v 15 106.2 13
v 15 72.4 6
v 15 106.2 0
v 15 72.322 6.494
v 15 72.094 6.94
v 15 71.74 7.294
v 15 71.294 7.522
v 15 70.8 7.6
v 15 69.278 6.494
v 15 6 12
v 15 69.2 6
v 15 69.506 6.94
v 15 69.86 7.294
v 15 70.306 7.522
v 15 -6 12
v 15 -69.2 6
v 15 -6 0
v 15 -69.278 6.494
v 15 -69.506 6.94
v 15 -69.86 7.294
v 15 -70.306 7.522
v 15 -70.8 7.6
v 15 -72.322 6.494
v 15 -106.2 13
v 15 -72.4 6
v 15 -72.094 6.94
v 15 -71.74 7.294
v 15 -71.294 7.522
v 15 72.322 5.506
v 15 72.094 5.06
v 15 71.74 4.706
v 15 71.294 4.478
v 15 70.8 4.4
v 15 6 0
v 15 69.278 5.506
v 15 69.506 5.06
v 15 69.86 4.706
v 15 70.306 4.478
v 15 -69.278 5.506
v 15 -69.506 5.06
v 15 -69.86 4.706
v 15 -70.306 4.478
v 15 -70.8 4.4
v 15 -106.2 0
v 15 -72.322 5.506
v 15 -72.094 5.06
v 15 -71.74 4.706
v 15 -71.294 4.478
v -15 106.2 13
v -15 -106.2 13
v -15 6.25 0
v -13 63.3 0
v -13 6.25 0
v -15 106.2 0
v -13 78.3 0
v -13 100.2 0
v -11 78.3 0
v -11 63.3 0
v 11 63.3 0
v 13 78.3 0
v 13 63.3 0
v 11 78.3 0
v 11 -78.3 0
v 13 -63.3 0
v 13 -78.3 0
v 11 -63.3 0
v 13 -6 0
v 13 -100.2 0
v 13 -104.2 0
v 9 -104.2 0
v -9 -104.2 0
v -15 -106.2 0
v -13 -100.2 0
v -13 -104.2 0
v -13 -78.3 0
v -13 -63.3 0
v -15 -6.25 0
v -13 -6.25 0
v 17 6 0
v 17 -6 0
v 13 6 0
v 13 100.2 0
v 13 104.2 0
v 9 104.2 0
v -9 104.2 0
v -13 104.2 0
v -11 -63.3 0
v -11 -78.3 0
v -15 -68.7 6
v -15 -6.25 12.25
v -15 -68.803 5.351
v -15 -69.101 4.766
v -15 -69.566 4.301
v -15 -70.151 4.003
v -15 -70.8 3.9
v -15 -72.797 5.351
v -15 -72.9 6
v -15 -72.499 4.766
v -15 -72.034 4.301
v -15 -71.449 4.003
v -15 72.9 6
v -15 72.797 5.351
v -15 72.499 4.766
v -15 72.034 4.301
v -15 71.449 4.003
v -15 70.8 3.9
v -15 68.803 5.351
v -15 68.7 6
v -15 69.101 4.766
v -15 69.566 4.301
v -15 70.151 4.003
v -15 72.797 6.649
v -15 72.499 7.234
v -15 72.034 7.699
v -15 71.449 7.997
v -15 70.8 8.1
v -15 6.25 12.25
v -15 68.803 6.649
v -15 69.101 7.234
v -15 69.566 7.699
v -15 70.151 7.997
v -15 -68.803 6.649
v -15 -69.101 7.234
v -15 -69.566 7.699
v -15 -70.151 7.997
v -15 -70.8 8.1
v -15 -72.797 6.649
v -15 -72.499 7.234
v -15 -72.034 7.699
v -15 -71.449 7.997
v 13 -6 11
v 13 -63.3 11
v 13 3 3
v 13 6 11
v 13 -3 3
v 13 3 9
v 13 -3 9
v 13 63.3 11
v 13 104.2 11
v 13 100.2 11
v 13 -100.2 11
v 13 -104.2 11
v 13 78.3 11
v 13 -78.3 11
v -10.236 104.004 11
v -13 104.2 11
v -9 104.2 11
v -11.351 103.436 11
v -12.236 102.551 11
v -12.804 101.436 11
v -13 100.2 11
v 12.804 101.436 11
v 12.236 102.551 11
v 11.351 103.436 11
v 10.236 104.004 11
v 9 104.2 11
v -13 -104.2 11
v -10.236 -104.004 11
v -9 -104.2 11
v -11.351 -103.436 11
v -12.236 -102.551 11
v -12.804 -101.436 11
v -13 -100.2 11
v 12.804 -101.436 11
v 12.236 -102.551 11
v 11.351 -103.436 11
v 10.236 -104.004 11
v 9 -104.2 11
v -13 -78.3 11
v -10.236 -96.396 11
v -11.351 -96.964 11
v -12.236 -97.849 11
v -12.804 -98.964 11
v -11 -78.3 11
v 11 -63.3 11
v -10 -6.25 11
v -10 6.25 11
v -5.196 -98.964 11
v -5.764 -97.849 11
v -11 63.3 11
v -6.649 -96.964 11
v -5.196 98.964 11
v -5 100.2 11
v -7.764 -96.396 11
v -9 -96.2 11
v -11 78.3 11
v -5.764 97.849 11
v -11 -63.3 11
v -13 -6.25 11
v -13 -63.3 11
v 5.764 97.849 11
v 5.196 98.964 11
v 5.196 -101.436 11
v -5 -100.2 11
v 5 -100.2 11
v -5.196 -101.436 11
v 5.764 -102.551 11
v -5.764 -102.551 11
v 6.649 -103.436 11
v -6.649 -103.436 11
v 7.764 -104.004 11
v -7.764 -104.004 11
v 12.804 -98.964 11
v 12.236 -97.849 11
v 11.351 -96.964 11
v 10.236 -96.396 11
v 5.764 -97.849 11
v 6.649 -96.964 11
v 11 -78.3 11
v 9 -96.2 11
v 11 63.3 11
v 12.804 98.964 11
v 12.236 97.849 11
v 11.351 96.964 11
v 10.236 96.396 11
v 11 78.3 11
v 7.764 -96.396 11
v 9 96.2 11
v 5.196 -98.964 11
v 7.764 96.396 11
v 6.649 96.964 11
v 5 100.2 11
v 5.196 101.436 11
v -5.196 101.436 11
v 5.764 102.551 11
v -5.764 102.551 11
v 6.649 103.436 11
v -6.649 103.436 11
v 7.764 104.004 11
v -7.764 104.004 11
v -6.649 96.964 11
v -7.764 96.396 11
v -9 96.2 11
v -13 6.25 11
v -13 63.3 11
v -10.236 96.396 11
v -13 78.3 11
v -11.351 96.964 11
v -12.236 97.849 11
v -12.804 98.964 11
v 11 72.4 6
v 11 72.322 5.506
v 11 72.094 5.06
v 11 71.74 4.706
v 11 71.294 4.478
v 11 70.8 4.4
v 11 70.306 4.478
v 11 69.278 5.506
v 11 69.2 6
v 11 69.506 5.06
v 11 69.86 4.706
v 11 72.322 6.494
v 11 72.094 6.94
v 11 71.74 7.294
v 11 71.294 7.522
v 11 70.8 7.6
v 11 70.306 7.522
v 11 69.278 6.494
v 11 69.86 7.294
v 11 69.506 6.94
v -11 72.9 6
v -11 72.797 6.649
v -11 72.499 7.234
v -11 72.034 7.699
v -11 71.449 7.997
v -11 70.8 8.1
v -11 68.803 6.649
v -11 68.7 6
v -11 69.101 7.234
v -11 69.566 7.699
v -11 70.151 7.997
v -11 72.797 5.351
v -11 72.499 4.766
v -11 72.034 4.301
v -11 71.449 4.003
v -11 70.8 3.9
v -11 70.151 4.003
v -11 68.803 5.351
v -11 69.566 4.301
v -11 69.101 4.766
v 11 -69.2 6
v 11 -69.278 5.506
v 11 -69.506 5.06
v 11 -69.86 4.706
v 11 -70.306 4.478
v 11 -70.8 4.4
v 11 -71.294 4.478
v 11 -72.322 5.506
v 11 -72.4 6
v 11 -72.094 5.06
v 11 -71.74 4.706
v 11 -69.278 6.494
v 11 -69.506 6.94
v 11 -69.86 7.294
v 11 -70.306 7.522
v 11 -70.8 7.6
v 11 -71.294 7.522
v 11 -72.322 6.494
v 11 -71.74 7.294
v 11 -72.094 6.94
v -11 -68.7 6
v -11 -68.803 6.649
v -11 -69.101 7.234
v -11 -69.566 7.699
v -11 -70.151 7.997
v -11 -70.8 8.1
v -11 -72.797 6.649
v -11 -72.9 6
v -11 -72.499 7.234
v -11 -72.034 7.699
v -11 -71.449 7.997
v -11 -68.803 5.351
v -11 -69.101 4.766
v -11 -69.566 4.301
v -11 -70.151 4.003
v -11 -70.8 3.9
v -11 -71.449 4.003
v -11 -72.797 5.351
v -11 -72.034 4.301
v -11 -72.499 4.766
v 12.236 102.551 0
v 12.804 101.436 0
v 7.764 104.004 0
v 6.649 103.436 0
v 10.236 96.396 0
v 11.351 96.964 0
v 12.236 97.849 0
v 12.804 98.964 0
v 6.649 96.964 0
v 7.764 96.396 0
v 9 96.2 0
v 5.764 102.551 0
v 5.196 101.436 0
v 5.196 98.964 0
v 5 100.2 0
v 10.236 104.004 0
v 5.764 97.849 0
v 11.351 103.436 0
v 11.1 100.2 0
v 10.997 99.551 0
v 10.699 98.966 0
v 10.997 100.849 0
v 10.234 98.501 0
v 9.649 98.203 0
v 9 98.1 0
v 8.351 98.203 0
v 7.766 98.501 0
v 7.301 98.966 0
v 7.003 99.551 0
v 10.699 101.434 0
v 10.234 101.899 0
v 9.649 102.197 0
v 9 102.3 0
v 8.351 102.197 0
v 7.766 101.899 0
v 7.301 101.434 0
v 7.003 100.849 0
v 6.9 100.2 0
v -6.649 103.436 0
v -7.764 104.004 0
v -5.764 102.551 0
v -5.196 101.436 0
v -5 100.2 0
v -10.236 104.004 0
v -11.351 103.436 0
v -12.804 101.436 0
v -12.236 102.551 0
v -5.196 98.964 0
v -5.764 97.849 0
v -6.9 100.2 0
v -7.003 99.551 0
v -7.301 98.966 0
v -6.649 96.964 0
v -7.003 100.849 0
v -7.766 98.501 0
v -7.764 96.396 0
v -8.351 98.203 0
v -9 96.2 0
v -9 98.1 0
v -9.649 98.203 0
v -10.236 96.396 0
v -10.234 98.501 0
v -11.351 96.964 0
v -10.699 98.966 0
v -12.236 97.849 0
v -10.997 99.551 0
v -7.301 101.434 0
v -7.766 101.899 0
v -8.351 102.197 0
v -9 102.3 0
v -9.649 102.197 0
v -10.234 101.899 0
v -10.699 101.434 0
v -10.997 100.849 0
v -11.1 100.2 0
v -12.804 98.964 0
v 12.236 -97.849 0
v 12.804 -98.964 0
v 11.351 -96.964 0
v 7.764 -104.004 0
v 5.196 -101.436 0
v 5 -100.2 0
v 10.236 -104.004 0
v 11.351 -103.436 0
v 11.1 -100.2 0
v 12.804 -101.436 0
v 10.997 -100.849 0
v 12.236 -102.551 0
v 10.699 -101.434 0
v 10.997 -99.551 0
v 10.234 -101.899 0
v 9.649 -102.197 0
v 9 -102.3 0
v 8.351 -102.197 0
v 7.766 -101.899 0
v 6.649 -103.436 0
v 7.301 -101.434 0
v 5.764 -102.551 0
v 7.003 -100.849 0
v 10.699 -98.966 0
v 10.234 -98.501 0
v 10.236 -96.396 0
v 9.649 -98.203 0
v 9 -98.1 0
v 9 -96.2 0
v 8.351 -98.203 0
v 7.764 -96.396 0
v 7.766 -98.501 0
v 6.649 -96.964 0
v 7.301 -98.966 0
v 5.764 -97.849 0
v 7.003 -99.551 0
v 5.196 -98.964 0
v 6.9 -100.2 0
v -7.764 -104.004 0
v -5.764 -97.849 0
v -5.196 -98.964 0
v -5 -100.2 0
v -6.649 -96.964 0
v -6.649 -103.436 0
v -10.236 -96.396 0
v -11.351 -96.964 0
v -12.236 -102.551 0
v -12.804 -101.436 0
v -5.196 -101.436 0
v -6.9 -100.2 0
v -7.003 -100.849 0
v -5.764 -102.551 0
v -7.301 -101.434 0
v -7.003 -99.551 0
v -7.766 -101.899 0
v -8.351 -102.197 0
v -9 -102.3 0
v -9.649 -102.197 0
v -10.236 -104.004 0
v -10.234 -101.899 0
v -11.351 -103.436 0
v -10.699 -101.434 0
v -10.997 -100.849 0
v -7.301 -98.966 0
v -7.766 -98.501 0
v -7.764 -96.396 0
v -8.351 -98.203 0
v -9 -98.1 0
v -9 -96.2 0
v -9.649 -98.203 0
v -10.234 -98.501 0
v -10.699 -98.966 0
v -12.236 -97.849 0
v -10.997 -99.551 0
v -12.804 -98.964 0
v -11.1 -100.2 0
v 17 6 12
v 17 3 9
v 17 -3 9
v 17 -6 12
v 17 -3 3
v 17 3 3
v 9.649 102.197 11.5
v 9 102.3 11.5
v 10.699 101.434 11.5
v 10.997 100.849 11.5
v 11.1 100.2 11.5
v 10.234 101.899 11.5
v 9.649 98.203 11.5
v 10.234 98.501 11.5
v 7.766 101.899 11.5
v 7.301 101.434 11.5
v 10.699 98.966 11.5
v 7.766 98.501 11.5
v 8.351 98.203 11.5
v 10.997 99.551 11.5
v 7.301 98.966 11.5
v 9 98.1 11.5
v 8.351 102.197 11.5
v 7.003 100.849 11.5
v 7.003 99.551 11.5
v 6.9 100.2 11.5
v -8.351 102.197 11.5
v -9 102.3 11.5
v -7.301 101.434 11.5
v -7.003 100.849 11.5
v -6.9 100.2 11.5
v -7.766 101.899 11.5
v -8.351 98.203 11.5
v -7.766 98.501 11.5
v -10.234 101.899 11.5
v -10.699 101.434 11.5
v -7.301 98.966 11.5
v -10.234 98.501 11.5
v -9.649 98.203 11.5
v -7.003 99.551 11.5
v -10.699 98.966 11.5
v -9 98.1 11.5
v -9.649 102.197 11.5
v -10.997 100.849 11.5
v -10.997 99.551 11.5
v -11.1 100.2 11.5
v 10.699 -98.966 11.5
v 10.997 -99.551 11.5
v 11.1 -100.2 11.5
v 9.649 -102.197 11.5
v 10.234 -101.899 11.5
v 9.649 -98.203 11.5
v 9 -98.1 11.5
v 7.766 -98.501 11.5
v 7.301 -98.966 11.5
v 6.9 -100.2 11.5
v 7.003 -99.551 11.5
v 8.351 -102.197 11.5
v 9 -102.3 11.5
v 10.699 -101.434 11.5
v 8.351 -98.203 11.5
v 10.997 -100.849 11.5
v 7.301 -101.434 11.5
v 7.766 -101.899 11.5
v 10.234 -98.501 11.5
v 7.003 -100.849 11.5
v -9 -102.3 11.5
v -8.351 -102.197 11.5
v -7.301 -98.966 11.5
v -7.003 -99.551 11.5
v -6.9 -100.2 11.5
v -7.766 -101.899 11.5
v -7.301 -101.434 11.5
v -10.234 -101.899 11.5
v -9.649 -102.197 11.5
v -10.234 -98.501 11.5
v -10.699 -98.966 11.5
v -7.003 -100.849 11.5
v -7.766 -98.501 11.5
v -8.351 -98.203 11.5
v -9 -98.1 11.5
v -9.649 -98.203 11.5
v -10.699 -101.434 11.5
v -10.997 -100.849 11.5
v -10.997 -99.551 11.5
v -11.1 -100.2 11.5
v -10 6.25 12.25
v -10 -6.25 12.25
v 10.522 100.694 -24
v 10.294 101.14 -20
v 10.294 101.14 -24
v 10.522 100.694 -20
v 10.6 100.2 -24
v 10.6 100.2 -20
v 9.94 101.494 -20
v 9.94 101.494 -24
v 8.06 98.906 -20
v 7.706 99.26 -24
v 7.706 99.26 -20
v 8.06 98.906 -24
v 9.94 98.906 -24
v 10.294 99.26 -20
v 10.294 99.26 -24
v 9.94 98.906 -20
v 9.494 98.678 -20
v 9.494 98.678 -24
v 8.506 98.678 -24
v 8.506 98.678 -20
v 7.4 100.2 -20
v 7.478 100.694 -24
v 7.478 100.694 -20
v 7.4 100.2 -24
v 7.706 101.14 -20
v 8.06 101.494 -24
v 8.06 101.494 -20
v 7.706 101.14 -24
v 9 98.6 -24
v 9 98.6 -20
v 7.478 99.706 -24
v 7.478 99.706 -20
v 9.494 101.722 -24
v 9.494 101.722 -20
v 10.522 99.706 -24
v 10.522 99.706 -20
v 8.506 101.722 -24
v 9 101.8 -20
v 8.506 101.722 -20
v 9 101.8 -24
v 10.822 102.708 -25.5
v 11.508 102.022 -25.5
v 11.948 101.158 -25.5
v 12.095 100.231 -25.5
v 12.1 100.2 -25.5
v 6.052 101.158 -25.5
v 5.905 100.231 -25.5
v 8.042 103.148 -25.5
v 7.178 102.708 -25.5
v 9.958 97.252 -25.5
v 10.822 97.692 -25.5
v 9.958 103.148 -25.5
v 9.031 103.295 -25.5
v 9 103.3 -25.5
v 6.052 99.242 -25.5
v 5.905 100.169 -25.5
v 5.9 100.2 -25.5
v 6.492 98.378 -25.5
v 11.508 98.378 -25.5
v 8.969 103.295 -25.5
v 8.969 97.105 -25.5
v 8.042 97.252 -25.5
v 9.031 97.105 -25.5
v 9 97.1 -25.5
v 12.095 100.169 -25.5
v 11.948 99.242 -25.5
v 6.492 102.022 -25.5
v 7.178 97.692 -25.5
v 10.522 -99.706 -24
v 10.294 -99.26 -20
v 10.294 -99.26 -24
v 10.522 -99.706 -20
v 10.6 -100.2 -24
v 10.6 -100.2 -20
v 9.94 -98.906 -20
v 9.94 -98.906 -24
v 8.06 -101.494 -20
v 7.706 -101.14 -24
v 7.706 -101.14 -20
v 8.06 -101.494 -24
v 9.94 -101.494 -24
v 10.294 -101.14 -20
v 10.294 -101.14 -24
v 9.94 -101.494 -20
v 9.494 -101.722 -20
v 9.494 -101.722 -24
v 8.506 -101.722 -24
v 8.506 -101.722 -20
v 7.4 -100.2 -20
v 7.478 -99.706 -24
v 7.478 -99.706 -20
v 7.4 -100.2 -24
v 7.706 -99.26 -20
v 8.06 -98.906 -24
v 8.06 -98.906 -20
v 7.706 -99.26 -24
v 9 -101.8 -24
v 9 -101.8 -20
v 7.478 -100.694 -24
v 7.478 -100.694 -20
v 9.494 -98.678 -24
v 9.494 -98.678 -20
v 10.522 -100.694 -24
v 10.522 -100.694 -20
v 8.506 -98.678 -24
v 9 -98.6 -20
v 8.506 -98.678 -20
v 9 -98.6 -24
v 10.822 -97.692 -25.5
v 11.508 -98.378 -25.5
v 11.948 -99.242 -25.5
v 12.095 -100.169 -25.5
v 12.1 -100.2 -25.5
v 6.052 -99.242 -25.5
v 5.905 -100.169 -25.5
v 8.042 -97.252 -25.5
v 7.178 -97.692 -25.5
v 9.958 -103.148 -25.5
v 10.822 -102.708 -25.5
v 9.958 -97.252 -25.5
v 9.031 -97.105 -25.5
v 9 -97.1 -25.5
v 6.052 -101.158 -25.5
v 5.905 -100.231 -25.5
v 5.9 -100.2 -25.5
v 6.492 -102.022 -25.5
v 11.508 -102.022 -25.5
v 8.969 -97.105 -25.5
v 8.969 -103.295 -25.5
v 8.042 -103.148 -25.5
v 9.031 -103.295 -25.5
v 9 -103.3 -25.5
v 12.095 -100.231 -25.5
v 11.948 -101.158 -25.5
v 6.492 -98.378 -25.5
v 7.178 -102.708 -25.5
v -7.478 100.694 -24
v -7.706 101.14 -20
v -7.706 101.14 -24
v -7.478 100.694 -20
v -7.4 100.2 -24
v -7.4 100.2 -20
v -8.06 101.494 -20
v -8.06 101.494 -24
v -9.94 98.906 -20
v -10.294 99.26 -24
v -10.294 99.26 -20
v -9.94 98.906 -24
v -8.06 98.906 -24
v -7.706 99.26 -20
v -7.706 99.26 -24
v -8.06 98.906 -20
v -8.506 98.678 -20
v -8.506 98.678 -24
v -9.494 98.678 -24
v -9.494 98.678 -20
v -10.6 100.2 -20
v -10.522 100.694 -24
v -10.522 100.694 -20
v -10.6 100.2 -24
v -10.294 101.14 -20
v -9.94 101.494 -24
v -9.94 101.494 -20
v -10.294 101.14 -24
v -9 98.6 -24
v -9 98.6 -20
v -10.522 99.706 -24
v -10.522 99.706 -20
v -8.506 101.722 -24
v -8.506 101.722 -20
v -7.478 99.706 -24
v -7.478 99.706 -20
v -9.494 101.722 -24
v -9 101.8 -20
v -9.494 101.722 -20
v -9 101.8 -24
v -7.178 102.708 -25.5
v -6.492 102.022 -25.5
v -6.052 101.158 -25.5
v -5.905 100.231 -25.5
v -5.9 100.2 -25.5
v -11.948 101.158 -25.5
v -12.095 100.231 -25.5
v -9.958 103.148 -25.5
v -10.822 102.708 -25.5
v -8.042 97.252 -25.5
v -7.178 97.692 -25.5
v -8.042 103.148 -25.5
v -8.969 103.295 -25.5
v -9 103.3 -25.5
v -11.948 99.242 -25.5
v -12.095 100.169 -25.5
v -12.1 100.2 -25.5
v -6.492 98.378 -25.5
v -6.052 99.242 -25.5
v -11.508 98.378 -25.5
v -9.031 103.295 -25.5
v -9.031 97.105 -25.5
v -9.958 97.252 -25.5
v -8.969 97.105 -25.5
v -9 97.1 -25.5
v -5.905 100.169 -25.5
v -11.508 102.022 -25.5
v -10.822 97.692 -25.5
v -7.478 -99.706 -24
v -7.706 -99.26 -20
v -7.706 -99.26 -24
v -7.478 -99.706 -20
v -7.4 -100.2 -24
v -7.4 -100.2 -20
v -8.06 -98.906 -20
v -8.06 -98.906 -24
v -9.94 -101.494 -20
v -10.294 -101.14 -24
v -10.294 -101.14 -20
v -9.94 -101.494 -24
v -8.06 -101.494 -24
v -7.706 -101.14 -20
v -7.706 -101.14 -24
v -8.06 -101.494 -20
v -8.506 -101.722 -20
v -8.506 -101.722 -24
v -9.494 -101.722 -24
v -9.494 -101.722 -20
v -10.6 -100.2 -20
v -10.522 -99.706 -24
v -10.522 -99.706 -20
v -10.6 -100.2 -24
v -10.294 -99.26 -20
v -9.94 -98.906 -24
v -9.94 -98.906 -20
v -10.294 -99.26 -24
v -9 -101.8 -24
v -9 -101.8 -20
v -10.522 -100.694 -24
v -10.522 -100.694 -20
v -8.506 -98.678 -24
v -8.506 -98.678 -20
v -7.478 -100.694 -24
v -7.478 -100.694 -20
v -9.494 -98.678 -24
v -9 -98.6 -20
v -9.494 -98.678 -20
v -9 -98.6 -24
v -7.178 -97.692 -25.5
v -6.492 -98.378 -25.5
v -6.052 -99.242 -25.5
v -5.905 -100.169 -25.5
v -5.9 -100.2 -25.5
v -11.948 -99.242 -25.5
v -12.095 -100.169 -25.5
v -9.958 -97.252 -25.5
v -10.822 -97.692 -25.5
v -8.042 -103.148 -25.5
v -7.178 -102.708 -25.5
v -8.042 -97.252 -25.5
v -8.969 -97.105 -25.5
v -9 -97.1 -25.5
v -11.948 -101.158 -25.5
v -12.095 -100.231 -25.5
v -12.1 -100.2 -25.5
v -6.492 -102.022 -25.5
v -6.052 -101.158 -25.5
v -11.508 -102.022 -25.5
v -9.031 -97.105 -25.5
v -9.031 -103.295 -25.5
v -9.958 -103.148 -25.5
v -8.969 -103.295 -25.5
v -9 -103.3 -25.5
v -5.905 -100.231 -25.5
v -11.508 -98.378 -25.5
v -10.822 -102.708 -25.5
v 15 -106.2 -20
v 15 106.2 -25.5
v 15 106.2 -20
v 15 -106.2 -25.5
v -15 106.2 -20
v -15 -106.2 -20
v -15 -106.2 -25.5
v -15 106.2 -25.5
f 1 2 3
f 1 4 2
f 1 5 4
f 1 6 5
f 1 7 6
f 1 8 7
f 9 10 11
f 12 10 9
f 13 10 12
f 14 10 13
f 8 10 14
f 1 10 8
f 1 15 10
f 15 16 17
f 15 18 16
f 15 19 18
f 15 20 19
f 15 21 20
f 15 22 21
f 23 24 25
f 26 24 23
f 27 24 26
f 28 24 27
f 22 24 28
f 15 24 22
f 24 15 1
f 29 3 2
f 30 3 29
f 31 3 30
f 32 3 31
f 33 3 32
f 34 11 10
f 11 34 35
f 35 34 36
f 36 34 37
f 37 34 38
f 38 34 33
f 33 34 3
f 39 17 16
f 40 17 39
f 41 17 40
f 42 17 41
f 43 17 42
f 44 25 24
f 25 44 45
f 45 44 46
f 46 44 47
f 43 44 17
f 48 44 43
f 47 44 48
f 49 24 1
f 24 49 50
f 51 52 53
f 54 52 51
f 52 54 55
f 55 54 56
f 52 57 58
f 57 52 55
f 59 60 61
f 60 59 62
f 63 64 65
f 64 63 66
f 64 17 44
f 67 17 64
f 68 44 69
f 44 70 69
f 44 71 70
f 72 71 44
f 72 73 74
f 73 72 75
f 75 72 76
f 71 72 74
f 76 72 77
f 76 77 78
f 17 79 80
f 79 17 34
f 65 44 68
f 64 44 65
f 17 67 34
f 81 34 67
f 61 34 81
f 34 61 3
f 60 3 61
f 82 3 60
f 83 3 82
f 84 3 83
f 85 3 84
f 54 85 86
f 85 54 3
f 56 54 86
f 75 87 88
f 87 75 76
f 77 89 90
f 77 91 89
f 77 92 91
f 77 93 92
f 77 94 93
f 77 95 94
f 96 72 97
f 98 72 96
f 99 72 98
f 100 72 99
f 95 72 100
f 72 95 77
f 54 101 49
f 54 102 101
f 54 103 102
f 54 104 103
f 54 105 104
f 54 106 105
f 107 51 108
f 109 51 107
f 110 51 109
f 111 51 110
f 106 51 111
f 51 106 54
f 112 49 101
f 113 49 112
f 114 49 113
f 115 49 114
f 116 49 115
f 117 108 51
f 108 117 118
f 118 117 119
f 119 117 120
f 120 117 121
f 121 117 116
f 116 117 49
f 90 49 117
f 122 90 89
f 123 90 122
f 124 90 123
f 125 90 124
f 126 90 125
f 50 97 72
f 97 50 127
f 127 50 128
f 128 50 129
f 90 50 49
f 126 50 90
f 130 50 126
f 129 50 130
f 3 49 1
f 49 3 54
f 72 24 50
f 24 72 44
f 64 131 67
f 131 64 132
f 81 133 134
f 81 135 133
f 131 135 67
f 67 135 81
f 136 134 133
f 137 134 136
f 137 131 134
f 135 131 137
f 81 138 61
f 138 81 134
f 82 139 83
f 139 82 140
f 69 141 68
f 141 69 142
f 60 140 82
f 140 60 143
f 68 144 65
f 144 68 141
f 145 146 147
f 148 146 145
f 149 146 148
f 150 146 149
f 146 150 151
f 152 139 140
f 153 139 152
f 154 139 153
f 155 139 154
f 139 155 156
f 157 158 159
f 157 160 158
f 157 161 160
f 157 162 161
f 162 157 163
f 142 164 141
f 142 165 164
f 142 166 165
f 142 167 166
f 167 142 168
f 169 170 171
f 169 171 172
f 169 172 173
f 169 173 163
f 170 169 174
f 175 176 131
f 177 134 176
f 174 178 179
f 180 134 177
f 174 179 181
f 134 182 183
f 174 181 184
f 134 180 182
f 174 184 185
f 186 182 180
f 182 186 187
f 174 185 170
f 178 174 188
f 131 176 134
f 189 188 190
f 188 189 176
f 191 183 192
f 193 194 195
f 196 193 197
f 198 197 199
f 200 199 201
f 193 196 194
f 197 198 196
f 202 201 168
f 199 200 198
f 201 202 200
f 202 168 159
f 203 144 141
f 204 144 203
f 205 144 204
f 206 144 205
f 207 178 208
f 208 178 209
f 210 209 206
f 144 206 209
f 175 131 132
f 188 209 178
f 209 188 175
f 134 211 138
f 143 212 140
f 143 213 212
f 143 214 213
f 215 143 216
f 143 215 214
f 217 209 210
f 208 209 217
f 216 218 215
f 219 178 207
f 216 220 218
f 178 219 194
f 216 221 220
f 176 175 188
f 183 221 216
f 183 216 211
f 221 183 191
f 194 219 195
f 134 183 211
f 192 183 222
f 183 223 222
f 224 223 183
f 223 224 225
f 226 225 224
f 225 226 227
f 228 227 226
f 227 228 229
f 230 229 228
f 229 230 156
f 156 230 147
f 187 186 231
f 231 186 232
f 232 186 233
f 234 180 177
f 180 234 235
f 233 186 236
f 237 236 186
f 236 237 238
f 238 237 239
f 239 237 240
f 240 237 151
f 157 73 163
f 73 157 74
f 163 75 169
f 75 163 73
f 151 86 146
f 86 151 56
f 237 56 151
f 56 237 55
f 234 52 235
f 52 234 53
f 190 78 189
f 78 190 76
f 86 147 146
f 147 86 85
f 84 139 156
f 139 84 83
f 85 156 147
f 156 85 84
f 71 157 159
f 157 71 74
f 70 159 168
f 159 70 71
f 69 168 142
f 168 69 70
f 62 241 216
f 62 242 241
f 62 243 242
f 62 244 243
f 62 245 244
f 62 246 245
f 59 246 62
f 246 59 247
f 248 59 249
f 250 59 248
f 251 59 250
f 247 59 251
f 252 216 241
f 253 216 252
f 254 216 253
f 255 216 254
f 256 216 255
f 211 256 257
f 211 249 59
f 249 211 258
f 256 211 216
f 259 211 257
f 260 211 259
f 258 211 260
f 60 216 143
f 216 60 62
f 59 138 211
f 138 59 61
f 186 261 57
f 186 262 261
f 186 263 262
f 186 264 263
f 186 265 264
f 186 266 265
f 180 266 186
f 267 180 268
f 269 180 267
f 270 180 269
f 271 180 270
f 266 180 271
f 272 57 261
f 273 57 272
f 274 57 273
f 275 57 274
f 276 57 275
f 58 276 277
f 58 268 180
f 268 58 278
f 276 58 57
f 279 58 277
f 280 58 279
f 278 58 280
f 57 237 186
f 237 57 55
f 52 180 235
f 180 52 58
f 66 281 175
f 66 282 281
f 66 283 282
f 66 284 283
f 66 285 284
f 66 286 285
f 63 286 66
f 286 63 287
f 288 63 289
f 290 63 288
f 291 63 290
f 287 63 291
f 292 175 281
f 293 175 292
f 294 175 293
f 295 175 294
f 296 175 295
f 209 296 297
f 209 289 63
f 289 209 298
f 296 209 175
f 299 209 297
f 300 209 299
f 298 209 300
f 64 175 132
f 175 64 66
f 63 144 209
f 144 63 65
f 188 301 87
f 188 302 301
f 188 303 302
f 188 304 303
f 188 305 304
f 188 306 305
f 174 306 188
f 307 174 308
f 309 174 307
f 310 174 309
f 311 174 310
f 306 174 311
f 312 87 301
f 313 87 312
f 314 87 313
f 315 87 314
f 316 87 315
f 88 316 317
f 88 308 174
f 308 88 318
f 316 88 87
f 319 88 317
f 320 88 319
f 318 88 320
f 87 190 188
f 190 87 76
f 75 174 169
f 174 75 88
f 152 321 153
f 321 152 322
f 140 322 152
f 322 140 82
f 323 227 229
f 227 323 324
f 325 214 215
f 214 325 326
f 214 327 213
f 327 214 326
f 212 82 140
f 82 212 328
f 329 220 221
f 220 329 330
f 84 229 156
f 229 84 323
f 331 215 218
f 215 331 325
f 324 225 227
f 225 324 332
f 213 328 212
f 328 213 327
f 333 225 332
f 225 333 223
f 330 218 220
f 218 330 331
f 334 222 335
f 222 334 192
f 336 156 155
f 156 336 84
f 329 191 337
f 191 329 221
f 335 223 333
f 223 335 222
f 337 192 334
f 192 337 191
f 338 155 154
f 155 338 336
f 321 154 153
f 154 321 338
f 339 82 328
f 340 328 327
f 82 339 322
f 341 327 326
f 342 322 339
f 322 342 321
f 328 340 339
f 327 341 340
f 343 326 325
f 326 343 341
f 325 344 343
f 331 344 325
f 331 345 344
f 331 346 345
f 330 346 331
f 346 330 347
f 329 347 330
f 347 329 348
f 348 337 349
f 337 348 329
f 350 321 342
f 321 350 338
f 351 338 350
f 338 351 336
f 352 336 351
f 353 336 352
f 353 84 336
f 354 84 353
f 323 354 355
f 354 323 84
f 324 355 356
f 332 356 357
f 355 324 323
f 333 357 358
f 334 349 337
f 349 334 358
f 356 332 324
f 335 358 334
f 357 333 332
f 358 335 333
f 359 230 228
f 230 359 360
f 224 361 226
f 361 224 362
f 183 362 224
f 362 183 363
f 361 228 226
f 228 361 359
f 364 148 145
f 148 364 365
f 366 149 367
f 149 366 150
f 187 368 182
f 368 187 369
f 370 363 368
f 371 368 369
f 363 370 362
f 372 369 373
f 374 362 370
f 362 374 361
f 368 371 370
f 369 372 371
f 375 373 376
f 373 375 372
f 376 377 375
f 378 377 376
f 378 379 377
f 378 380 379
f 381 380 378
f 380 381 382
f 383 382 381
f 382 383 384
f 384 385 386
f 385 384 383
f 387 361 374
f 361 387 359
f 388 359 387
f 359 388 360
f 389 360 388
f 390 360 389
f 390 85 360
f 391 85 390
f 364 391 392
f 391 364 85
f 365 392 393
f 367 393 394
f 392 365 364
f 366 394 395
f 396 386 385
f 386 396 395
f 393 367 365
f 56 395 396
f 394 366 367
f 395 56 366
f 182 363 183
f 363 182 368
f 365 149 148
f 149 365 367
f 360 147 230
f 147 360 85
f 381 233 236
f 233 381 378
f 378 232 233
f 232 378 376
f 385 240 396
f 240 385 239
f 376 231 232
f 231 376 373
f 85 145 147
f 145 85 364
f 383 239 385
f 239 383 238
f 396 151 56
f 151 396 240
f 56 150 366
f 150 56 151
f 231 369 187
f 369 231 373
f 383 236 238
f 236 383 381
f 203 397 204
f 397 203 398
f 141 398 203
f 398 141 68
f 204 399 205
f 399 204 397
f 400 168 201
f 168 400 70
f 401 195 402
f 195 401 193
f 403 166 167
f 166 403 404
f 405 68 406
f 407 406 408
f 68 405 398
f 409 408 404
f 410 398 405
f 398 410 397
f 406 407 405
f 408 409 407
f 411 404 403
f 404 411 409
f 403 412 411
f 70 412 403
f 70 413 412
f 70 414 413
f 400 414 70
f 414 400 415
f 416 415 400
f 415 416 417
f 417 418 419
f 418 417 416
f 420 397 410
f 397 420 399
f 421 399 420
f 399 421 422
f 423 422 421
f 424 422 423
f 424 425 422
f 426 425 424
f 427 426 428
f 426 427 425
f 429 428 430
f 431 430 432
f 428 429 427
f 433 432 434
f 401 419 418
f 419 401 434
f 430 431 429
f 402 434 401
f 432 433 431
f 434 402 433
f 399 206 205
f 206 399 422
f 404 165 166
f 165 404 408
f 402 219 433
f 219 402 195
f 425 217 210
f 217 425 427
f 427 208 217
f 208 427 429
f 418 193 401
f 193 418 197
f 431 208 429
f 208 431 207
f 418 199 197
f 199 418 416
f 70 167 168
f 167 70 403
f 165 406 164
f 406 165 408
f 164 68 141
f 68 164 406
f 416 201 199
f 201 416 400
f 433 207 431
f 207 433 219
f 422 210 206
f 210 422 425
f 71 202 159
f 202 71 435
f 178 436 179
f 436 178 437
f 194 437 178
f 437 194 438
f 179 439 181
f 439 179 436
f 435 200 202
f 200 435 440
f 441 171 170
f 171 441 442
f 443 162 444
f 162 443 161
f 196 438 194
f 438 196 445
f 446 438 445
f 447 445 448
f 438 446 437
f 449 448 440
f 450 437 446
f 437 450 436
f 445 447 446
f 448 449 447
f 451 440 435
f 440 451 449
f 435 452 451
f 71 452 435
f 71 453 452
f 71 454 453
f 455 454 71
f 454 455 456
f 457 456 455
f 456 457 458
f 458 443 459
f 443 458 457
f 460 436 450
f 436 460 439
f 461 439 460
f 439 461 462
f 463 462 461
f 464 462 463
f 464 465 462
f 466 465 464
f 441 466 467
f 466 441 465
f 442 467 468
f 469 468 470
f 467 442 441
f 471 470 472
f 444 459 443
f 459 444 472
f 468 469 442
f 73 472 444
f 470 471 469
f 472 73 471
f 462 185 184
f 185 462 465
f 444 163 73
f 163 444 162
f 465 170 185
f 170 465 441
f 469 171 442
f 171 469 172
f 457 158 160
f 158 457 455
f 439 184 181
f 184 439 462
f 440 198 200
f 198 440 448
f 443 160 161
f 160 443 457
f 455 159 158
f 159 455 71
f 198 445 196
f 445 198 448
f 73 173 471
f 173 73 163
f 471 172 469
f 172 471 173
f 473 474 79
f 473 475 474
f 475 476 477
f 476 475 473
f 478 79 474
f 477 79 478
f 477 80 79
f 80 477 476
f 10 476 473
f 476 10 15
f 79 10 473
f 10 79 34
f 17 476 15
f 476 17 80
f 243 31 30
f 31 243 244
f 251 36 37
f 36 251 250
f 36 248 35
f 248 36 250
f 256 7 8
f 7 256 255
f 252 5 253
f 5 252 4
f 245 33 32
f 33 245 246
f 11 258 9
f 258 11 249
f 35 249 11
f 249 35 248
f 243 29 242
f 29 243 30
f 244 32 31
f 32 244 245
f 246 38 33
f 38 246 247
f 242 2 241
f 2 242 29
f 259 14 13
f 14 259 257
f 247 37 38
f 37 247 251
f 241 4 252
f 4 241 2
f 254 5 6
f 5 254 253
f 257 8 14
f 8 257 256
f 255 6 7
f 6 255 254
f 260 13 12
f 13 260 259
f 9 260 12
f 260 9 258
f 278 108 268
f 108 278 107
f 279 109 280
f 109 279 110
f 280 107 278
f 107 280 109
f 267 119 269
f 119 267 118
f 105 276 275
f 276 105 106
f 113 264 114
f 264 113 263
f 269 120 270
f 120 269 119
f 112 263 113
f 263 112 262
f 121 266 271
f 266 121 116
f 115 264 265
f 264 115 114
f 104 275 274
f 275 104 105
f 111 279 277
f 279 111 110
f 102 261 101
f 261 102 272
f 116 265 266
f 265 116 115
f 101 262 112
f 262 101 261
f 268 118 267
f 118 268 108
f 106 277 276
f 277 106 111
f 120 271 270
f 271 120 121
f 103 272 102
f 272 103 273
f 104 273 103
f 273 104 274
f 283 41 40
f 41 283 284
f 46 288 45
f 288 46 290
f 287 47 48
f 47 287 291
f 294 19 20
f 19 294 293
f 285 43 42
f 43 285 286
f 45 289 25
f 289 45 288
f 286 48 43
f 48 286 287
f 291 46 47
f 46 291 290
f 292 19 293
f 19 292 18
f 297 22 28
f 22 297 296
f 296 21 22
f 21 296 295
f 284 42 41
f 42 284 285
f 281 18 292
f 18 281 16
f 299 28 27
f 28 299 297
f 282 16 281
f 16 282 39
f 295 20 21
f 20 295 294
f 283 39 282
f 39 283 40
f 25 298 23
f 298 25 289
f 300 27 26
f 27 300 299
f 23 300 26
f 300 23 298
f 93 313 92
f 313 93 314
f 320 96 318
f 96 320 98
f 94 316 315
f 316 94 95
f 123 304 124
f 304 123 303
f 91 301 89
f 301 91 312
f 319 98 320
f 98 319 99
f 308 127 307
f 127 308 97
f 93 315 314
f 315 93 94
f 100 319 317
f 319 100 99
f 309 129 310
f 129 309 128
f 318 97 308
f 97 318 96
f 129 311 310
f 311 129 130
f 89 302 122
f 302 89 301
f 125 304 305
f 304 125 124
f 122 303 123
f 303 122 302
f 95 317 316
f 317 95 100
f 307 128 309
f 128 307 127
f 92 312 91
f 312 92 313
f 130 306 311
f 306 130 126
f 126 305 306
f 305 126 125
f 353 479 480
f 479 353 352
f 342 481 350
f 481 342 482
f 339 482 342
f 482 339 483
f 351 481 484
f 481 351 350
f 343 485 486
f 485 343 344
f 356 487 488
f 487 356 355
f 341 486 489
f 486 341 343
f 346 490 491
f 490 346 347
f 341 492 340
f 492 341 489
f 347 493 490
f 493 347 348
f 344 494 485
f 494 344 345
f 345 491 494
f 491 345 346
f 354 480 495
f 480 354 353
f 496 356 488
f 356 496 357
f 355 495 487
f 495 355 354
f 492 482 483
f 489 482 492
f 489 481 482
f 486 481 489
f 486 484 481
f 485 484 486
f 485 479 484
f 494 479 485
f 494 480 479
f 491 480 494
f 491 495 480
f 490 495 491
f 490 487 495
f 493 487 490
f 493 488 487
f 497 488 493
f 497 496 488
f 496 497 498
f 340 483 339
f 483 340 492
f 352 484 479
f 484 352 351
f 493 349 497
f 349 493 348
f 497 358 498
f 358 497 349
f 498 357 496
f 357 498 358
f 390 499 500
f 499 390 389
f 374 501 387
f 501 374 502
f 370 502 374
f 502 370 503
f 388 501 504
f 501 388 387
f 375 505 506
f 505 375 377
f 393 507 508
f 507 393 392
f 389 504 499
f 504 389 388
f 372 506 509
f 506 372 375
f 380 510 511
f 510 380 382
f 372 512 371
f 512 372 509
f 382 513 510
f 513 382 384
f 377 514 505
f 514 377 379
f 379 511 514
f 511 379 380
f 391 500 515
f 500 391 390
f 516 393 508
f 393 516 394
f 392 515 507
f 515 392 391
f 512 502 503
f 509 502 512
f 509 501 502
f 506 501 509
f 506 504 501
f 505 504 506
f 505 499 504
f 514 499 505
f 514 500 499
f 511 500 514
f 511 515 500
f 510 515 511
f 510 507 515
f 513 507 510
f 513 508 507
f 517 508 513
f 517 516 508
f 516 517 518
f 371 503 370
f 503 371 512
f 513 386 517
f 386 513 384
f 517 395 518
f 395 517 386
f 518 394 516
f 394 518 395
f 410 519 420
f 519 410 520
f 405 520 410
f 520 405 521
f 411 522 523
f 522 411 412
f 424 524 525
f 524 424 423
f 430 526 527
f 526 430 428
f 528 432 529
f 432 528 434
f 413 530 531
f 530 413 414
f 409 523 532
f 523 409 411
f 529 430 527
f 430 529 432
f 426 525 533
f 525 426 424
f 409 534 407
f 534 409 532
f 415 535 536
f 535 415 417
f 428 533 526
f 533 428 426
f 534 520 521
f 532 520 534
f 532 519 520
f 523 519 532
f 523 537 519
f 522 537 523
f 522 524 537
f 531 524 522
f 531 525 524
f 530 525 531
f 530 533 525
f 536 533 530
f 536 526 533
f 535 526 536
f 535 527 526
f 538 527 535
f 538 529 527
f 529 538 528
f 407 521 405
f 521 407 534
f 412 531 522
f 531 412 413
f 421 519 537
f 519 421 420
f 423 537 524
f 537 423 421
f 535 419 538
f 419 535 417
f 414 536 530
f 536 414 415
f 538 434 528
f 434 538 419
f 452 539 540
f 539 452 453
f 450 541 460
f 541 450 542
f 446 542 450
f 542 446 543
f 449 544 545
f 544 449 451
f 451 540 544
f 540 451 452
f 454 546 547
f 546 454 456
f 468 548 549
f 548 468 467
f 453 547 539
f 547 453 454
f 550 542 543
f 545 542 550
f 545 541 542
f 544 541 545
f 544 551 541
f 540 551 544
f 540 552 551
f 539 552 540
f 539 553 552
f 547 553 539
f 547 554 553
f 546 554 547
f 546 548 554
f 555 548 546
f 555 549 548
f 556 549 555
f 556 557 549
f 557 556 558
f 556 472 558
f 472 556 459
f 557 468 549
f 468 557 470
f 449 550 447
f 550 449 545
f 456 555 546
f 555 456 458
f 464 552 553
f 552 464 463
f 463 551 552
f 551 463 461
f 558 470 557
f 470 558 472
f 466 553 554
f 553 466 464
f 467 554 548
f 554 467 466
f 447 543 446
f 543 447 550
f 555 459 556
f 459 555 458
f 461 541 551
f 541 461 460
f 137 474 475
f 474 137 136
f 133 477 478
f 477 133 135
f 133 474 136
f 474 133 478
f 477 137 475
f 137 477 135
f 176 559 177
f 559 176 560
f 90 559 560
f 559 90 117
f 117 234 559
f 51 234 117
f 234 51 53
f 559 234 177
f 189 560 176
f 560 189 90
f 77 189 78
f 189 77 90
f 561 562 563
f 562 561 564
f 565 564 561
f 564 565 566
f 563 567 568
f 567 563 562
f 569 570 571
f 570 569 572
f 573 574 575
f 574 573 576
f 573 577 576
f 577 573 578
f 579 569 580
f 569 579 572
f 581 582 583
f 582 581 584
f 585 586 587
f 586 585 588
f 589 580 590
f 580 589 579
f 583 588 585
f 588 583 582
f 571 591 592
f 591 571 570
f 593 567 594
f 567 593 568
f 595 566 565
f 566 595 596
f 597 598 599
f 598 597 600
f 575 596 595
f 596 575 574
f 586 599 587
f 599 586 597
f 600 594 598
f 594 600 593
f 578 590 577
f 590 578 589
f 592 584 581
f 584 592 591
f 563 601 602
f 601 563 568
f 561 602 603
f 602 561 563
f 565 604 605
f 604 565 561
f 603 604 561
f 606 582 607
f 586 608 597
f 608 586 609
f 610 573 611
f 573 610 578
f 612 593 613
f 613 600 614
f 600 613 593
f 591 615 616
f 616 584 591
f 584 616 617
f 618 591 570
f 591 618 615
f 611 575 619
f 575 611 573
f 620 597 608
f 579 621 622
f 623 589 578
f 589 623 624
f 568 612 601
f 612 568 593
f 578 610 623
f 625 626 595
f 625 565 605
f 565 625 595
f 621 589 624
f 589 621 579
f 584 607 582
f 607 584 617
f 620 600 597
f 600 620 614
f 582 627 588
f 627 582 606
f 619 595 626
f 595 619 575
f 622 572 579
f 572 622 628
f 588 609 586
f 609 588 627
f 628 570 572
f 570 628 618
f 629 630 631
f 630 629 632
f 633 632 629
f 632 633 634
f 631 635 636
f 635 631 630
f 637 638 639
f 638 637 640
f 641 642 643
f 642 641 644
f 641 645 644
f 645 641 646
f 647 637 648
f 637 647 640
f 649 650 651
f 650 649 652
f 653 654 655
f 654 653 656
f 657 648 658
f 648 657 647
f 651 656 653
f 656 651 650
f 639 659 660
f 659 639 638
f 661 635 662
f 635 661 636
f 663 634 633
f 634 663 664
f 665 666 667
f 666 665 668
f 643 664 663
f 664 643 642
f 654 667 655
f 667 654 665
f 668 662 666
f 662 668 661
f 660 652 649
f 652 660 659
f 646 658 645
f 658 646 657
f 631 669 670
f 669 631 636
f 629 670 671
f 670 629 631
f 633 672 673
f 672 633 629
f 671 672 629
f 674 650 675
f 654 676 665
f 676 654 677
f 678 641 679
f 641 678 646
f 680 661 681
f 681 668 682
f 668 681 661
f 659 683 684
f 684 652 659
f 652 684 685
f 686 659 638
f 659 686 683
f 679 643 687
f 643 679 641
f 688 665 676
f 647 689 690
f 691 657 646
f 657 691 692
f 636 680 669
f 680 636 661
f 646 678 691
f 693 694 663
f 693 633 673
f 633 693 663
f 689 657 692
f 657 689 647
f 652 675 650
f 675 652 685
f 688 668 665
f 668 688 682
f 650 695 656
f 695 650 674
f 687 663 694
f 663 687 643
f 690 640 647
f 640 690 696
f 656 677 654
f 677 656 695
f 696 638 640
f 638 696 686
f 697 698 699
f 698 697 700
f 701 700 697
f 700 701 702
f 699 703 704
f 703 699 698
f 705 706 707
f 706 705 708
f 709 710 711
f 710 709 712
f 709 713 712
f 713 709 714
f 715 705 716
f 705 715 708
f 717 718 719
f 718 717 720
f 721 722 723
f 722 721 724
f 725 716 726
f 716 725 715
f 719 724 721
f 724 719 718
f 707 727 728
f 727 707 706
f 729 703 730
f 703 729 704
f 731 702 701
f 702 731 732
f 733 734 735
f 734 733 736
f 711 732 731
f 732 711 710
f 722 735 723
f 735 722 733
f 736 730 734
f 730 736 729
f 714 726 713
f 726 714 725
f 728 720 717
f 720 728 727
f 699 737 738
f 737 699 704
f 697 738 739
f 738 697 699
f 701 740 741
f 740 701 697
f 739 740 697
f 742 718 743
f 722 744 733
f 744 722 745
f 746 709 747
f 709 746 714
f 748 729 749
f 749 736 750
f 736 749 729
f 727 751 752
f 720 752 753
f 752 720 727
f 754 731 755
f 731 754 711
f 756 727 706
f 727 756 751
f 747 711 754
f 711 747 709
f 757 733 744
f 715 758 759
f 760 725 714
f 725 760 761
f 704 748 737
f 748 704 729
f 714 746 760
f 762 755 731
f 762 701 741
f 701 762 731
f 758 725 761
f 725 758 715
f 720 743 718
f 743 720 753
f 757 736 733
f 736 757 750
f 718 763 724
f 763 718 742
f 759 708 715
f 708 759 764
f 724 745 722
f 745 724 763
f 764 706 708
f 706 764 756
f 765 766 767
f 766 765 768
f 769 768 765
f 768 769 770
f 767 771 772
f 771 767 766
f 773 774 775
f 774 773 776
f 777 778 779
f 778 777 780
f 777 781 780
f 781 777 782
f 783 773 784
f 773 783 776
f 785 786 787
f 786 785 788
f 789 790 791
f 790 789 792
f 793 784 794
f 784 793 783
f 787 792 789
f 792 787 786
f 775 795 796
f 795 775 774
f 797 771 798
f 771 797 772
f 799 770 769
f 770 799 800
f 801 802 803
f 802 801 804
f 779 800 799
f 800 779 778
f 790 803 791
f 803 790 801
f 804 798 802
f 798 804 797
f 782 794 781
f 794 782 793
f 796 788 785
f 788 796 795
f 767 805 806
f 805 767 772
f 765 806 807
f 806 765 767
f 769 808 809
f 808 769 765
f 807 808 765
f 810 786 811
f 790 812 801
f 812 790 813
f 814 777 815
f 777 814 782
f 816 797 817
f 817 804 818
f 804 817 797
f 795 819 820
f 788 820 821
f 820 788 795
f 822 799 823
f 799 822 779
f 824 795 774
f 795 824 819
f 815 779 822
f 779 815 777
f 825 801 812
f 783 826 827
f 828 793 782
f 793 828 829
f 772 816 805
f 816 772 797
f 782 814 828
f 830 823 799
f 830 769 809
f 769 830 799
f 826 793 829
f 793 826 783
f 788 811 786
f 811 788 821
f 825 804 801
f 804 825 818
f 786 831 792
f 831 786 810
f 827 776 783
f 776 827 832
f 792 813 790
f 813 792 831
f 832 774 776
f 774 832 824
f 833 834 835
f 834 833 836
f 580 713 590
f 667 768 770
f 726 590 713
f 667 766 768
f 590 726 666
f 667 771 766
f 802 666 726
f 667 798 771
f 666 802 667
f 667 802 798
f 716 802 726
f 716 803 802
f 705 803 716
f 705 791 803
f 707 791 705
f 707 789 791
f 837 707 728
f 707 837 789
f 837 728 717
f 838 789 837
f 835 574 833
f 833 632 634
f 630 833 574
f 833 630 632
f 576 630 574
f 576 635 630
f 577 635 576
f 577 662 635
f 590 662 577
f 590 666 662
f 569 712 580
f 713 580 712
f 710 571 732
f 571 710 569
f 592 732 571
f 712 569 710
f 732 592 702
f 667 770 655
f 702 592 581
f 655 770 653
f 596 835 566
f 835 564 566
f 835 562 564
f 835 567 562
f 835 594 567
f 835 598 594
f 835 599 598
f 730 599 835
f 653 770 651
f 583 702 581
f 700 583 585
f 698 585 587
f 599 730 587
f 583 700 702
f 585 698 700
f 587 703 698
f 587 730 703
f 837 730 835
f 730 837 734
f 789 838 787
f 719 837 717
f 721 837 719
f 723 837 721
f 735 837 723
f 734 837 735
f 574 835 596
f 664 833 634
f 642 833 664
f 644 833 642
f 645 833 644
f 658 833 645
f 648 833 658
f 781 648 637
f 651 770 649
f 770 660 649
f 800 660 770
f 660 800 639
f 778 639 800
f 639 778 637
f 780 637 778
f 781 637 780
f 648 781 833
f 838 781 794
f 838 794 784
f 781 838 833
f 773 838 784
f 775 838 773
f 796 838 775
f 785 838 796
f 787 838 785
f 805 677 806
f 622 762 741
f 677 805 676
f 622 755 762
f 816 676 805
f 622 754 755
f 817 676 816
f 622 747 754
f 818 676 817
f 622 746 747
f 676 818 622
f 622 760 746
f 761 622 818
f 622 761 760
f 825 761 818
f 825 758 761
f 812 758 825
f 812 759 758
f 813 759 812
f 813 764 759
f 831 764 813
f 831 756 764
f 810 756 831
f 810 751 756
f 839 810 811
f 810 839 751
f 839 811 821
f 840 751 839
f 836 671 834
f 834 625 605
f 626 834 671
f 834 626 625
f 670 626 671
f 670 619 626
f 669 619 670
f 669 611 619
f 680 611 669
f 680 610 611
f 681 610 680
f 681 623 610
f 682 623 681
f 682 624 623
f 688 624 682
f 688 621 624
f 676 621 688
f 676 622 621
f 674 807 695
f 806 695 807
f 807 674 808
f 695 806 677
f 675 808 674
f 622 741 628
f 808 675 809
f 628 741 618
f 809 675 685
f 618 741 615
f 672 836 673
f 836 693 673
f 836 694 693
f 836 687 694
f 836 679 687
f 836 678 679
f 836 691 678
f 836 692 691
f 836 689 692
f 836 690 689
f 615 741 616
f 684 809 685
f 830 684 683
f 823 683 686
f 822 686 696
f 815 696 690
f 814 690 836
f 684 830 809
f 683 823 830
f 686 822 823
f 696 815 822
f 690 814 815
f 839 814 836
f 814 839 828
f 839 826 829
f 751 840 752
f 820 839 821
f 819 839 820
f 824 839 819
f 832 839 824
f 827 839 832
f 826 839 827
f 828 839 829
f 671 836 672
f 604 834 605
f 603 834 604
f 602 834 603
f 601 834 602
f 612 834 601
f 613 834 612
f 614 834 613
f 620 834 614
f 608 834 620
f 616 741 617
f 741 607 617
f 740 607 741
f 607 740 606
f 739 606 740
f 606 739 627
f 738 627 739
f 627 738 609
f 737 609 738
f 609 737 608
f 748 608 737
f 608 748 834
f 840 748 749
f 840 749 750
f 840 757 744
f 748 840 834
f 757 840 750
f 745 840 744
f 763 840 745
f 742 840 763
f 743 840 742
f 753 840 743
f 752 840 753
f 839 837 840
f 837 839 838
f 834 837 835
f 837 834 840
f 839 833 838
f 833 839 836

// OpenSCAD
// Spacer for Modular 7-Segment Display (v2 Design)
// Fits between digits to add configurable horizontal spacing.

// --- Key Parameters ---
spacer_width = 30;      // Width of the spacer in mm
panel_id = 2;           // Treated as a middle panel to have both left and right connectors

pitch = 83;             // Center-to-center distance between parallel LED strips (83 mm)
strip_width = 12;       // Width of LED strip (12 mm)
white_wall = 1.2;       // Thickness of the white inner reflector walls
margin_x = 15;          // Extra bezel space on left and right sides
margin_y = 15;          // Extra bezel space on top and bottom sides

tunnel_depth = 12;      // Depth of the light tunnel
diffuser_thick = 1.0;   // Thickness of the white top diffuser layer
backplate_floor = 1.5;  // Solid base floor under connector pockets
connector_thick = 4.0;  
backplate_thick = connector_thick + backplate_floor; // 6.0 mm total backplate thickness

// --- Calculated Dimensions ---
diffuser_w = strip_width + 2;      // inner diffuser width
total_seg_w = diffuser_w + white_wall * 2; // outer white cup width

// Height matches the standard digit panel height exactly
digit_height = pitch * 2 + total_seg_w + margin_y * 2; // 231.4 mm
total_depth = tunnel_depth + diffuser_thick;           // 13 mm

// --- Components ---

module spacer_frontplate() {
    difference() {
        union() {
            // 1. Main frame (hollowed out from the back, leaving 2mm walls and 2mm front face)
            difference() {
                translate([-spacer_width/2, -digit_height/2, 0]) cube([spacer_width, digit_height, total_depth]);
                translate([-spacer_width/2 + 2, -digit_height/2 + 2, -1]) cube([spacer_width - 4, digit_height - 4, total_depth - 1]);
            }
            
            // 2. Screw posts for backplate
            translate([spacer_width/2 - 6, digit_height/2 - 6, 0]) cylinder(h=total_depth, r=4, $fn=20);
            translate([-spacer_width/2 + 6, digit_height/2 - 6, 0]) cylinder(h=total_depth, r=4, $fn=20);
            translate([spacer_width/2 - 6, -digit_height/2 + 6, 0]) cylinder(h=total_depth, r=4, $fn=20);
            translate([-spacer_width/2 + 6, -digit_height/2 + 6, 0]) cylinder(h=total_depth, r=4, $fn=20);
            
            // 3. Mounting bosses for side screws
            for (y = [digit_height/3, -digit_height/3]) {
                // Right side gets mounting bosses
                translate([spacer_width/2 - 2, y, tunnel_depth/2 + 0.5]) cube([4, 15, tunnel_depth + 1], center=true);
                // Left side gets mounting bosses
                translate([-spacer_width/2 + 2, y, tunnel_depth/2 + 0.5]) cube([4, 15, tunnel_depth + 1], center=true);
            }
            
            // Inter-panel alignment protrusion (Right side, robust 12x12 male flange sticking out 2mm)
            translate([spacer_width/2, 0, tunnel_depth/2]) 
                cube([4, 12.0, 12.0], center=true);
        }
        
        // Screw holes for backplate to mount (sized for standard M3 heat-set inserts, 4.2mm diameter)
        translate([spacer_width/2 - 6, digit_height/2 - 6, -1]) cylinder(h=total_depth - 0.5, r=2.1, $fn=20);
        translate([-spacer_width/2 + 6, digit_height/2 - 6, -1]) cylinder(h=total_depth - 0.5, r=2.1, $fn=20);
        translate([spacer_width/2 - 6, -digit_height/2 + 6, -1]) cylinder(h=total_depth - 0.5, r=2.1, $fn=20);
        translate([-spacer_width/2 + 6, -digit_height/2 + 6, -1]) cylinder(h=total_depth - 0.5, r=2.1, $fn=20);
        
        // Side mounting holes
        for (y = [digit_height/3, -digit_height/3]) {
            // Right side gets clearance holes for the screws (3.2mm)
            translate([spacer_width/2, y, tunnel_depth/2]) rotate([0, 90, 0]) cylinder(h=20, r=1.6, center=true, $fn=20);
            // Left side gets holes for heat-set inserts (4.2mm) to receive the screws from the previous panel
            translate([-spacer_width/2, y, tunnel_depth/2]) rotate([0, 90, 0]) cylinder(h=20, r=2.1, center=true, $fn=20);
        }
        
        // Inter-panel wire pass-through hole (Right side, outgoing wires to next digit)
        translate([spacer_width/2, 0, tunnel_depth/2]) 
            cube([10, 6.0, 6.0], center=true);
        
        // Inter-panel wire pass-through & alignment receiver (Left side, incoming wires)
        translate([-spacer_width/2, 0, tunnel_depth/2]) 
            cube([10, 12.5, 12.5], center=true);
    }
}

module spacer_backplate() {
    difference() {
        // Main flat plate
        translate([-spacer_width/2, -digit_height/2, -backplate_thick])
            cube([spacer_width, digit_height, backplate_thick]);
            
        // Mounting screw holes (M3 clearance, 3.2mm) with countersink for flush heads
        for (x = [spacer_width/2 - 6, -spacer_width/2 + 6]) {
            for (y = [digit_height/2 - 6, -digit_height/2 + 6]) {
                translate([x, y, -backplate_thick - 0.1]) {
                    cylinder(h=backplate_thick + 0.2, r=1.6, $fn=20);       // Main shaft
                    cylinder(h=1.6, r1=3.2, r2=1.6, $fn=20);                // 90-degree countersink cone
                }
            }
        }
    }
}

// --- Render Assembly ---
color("DimGray") spacer_frontplate();
// Translated backwards by 20mm for preview
translate([0, 0, -20]) color("SlateGray") spacer_backplate();
